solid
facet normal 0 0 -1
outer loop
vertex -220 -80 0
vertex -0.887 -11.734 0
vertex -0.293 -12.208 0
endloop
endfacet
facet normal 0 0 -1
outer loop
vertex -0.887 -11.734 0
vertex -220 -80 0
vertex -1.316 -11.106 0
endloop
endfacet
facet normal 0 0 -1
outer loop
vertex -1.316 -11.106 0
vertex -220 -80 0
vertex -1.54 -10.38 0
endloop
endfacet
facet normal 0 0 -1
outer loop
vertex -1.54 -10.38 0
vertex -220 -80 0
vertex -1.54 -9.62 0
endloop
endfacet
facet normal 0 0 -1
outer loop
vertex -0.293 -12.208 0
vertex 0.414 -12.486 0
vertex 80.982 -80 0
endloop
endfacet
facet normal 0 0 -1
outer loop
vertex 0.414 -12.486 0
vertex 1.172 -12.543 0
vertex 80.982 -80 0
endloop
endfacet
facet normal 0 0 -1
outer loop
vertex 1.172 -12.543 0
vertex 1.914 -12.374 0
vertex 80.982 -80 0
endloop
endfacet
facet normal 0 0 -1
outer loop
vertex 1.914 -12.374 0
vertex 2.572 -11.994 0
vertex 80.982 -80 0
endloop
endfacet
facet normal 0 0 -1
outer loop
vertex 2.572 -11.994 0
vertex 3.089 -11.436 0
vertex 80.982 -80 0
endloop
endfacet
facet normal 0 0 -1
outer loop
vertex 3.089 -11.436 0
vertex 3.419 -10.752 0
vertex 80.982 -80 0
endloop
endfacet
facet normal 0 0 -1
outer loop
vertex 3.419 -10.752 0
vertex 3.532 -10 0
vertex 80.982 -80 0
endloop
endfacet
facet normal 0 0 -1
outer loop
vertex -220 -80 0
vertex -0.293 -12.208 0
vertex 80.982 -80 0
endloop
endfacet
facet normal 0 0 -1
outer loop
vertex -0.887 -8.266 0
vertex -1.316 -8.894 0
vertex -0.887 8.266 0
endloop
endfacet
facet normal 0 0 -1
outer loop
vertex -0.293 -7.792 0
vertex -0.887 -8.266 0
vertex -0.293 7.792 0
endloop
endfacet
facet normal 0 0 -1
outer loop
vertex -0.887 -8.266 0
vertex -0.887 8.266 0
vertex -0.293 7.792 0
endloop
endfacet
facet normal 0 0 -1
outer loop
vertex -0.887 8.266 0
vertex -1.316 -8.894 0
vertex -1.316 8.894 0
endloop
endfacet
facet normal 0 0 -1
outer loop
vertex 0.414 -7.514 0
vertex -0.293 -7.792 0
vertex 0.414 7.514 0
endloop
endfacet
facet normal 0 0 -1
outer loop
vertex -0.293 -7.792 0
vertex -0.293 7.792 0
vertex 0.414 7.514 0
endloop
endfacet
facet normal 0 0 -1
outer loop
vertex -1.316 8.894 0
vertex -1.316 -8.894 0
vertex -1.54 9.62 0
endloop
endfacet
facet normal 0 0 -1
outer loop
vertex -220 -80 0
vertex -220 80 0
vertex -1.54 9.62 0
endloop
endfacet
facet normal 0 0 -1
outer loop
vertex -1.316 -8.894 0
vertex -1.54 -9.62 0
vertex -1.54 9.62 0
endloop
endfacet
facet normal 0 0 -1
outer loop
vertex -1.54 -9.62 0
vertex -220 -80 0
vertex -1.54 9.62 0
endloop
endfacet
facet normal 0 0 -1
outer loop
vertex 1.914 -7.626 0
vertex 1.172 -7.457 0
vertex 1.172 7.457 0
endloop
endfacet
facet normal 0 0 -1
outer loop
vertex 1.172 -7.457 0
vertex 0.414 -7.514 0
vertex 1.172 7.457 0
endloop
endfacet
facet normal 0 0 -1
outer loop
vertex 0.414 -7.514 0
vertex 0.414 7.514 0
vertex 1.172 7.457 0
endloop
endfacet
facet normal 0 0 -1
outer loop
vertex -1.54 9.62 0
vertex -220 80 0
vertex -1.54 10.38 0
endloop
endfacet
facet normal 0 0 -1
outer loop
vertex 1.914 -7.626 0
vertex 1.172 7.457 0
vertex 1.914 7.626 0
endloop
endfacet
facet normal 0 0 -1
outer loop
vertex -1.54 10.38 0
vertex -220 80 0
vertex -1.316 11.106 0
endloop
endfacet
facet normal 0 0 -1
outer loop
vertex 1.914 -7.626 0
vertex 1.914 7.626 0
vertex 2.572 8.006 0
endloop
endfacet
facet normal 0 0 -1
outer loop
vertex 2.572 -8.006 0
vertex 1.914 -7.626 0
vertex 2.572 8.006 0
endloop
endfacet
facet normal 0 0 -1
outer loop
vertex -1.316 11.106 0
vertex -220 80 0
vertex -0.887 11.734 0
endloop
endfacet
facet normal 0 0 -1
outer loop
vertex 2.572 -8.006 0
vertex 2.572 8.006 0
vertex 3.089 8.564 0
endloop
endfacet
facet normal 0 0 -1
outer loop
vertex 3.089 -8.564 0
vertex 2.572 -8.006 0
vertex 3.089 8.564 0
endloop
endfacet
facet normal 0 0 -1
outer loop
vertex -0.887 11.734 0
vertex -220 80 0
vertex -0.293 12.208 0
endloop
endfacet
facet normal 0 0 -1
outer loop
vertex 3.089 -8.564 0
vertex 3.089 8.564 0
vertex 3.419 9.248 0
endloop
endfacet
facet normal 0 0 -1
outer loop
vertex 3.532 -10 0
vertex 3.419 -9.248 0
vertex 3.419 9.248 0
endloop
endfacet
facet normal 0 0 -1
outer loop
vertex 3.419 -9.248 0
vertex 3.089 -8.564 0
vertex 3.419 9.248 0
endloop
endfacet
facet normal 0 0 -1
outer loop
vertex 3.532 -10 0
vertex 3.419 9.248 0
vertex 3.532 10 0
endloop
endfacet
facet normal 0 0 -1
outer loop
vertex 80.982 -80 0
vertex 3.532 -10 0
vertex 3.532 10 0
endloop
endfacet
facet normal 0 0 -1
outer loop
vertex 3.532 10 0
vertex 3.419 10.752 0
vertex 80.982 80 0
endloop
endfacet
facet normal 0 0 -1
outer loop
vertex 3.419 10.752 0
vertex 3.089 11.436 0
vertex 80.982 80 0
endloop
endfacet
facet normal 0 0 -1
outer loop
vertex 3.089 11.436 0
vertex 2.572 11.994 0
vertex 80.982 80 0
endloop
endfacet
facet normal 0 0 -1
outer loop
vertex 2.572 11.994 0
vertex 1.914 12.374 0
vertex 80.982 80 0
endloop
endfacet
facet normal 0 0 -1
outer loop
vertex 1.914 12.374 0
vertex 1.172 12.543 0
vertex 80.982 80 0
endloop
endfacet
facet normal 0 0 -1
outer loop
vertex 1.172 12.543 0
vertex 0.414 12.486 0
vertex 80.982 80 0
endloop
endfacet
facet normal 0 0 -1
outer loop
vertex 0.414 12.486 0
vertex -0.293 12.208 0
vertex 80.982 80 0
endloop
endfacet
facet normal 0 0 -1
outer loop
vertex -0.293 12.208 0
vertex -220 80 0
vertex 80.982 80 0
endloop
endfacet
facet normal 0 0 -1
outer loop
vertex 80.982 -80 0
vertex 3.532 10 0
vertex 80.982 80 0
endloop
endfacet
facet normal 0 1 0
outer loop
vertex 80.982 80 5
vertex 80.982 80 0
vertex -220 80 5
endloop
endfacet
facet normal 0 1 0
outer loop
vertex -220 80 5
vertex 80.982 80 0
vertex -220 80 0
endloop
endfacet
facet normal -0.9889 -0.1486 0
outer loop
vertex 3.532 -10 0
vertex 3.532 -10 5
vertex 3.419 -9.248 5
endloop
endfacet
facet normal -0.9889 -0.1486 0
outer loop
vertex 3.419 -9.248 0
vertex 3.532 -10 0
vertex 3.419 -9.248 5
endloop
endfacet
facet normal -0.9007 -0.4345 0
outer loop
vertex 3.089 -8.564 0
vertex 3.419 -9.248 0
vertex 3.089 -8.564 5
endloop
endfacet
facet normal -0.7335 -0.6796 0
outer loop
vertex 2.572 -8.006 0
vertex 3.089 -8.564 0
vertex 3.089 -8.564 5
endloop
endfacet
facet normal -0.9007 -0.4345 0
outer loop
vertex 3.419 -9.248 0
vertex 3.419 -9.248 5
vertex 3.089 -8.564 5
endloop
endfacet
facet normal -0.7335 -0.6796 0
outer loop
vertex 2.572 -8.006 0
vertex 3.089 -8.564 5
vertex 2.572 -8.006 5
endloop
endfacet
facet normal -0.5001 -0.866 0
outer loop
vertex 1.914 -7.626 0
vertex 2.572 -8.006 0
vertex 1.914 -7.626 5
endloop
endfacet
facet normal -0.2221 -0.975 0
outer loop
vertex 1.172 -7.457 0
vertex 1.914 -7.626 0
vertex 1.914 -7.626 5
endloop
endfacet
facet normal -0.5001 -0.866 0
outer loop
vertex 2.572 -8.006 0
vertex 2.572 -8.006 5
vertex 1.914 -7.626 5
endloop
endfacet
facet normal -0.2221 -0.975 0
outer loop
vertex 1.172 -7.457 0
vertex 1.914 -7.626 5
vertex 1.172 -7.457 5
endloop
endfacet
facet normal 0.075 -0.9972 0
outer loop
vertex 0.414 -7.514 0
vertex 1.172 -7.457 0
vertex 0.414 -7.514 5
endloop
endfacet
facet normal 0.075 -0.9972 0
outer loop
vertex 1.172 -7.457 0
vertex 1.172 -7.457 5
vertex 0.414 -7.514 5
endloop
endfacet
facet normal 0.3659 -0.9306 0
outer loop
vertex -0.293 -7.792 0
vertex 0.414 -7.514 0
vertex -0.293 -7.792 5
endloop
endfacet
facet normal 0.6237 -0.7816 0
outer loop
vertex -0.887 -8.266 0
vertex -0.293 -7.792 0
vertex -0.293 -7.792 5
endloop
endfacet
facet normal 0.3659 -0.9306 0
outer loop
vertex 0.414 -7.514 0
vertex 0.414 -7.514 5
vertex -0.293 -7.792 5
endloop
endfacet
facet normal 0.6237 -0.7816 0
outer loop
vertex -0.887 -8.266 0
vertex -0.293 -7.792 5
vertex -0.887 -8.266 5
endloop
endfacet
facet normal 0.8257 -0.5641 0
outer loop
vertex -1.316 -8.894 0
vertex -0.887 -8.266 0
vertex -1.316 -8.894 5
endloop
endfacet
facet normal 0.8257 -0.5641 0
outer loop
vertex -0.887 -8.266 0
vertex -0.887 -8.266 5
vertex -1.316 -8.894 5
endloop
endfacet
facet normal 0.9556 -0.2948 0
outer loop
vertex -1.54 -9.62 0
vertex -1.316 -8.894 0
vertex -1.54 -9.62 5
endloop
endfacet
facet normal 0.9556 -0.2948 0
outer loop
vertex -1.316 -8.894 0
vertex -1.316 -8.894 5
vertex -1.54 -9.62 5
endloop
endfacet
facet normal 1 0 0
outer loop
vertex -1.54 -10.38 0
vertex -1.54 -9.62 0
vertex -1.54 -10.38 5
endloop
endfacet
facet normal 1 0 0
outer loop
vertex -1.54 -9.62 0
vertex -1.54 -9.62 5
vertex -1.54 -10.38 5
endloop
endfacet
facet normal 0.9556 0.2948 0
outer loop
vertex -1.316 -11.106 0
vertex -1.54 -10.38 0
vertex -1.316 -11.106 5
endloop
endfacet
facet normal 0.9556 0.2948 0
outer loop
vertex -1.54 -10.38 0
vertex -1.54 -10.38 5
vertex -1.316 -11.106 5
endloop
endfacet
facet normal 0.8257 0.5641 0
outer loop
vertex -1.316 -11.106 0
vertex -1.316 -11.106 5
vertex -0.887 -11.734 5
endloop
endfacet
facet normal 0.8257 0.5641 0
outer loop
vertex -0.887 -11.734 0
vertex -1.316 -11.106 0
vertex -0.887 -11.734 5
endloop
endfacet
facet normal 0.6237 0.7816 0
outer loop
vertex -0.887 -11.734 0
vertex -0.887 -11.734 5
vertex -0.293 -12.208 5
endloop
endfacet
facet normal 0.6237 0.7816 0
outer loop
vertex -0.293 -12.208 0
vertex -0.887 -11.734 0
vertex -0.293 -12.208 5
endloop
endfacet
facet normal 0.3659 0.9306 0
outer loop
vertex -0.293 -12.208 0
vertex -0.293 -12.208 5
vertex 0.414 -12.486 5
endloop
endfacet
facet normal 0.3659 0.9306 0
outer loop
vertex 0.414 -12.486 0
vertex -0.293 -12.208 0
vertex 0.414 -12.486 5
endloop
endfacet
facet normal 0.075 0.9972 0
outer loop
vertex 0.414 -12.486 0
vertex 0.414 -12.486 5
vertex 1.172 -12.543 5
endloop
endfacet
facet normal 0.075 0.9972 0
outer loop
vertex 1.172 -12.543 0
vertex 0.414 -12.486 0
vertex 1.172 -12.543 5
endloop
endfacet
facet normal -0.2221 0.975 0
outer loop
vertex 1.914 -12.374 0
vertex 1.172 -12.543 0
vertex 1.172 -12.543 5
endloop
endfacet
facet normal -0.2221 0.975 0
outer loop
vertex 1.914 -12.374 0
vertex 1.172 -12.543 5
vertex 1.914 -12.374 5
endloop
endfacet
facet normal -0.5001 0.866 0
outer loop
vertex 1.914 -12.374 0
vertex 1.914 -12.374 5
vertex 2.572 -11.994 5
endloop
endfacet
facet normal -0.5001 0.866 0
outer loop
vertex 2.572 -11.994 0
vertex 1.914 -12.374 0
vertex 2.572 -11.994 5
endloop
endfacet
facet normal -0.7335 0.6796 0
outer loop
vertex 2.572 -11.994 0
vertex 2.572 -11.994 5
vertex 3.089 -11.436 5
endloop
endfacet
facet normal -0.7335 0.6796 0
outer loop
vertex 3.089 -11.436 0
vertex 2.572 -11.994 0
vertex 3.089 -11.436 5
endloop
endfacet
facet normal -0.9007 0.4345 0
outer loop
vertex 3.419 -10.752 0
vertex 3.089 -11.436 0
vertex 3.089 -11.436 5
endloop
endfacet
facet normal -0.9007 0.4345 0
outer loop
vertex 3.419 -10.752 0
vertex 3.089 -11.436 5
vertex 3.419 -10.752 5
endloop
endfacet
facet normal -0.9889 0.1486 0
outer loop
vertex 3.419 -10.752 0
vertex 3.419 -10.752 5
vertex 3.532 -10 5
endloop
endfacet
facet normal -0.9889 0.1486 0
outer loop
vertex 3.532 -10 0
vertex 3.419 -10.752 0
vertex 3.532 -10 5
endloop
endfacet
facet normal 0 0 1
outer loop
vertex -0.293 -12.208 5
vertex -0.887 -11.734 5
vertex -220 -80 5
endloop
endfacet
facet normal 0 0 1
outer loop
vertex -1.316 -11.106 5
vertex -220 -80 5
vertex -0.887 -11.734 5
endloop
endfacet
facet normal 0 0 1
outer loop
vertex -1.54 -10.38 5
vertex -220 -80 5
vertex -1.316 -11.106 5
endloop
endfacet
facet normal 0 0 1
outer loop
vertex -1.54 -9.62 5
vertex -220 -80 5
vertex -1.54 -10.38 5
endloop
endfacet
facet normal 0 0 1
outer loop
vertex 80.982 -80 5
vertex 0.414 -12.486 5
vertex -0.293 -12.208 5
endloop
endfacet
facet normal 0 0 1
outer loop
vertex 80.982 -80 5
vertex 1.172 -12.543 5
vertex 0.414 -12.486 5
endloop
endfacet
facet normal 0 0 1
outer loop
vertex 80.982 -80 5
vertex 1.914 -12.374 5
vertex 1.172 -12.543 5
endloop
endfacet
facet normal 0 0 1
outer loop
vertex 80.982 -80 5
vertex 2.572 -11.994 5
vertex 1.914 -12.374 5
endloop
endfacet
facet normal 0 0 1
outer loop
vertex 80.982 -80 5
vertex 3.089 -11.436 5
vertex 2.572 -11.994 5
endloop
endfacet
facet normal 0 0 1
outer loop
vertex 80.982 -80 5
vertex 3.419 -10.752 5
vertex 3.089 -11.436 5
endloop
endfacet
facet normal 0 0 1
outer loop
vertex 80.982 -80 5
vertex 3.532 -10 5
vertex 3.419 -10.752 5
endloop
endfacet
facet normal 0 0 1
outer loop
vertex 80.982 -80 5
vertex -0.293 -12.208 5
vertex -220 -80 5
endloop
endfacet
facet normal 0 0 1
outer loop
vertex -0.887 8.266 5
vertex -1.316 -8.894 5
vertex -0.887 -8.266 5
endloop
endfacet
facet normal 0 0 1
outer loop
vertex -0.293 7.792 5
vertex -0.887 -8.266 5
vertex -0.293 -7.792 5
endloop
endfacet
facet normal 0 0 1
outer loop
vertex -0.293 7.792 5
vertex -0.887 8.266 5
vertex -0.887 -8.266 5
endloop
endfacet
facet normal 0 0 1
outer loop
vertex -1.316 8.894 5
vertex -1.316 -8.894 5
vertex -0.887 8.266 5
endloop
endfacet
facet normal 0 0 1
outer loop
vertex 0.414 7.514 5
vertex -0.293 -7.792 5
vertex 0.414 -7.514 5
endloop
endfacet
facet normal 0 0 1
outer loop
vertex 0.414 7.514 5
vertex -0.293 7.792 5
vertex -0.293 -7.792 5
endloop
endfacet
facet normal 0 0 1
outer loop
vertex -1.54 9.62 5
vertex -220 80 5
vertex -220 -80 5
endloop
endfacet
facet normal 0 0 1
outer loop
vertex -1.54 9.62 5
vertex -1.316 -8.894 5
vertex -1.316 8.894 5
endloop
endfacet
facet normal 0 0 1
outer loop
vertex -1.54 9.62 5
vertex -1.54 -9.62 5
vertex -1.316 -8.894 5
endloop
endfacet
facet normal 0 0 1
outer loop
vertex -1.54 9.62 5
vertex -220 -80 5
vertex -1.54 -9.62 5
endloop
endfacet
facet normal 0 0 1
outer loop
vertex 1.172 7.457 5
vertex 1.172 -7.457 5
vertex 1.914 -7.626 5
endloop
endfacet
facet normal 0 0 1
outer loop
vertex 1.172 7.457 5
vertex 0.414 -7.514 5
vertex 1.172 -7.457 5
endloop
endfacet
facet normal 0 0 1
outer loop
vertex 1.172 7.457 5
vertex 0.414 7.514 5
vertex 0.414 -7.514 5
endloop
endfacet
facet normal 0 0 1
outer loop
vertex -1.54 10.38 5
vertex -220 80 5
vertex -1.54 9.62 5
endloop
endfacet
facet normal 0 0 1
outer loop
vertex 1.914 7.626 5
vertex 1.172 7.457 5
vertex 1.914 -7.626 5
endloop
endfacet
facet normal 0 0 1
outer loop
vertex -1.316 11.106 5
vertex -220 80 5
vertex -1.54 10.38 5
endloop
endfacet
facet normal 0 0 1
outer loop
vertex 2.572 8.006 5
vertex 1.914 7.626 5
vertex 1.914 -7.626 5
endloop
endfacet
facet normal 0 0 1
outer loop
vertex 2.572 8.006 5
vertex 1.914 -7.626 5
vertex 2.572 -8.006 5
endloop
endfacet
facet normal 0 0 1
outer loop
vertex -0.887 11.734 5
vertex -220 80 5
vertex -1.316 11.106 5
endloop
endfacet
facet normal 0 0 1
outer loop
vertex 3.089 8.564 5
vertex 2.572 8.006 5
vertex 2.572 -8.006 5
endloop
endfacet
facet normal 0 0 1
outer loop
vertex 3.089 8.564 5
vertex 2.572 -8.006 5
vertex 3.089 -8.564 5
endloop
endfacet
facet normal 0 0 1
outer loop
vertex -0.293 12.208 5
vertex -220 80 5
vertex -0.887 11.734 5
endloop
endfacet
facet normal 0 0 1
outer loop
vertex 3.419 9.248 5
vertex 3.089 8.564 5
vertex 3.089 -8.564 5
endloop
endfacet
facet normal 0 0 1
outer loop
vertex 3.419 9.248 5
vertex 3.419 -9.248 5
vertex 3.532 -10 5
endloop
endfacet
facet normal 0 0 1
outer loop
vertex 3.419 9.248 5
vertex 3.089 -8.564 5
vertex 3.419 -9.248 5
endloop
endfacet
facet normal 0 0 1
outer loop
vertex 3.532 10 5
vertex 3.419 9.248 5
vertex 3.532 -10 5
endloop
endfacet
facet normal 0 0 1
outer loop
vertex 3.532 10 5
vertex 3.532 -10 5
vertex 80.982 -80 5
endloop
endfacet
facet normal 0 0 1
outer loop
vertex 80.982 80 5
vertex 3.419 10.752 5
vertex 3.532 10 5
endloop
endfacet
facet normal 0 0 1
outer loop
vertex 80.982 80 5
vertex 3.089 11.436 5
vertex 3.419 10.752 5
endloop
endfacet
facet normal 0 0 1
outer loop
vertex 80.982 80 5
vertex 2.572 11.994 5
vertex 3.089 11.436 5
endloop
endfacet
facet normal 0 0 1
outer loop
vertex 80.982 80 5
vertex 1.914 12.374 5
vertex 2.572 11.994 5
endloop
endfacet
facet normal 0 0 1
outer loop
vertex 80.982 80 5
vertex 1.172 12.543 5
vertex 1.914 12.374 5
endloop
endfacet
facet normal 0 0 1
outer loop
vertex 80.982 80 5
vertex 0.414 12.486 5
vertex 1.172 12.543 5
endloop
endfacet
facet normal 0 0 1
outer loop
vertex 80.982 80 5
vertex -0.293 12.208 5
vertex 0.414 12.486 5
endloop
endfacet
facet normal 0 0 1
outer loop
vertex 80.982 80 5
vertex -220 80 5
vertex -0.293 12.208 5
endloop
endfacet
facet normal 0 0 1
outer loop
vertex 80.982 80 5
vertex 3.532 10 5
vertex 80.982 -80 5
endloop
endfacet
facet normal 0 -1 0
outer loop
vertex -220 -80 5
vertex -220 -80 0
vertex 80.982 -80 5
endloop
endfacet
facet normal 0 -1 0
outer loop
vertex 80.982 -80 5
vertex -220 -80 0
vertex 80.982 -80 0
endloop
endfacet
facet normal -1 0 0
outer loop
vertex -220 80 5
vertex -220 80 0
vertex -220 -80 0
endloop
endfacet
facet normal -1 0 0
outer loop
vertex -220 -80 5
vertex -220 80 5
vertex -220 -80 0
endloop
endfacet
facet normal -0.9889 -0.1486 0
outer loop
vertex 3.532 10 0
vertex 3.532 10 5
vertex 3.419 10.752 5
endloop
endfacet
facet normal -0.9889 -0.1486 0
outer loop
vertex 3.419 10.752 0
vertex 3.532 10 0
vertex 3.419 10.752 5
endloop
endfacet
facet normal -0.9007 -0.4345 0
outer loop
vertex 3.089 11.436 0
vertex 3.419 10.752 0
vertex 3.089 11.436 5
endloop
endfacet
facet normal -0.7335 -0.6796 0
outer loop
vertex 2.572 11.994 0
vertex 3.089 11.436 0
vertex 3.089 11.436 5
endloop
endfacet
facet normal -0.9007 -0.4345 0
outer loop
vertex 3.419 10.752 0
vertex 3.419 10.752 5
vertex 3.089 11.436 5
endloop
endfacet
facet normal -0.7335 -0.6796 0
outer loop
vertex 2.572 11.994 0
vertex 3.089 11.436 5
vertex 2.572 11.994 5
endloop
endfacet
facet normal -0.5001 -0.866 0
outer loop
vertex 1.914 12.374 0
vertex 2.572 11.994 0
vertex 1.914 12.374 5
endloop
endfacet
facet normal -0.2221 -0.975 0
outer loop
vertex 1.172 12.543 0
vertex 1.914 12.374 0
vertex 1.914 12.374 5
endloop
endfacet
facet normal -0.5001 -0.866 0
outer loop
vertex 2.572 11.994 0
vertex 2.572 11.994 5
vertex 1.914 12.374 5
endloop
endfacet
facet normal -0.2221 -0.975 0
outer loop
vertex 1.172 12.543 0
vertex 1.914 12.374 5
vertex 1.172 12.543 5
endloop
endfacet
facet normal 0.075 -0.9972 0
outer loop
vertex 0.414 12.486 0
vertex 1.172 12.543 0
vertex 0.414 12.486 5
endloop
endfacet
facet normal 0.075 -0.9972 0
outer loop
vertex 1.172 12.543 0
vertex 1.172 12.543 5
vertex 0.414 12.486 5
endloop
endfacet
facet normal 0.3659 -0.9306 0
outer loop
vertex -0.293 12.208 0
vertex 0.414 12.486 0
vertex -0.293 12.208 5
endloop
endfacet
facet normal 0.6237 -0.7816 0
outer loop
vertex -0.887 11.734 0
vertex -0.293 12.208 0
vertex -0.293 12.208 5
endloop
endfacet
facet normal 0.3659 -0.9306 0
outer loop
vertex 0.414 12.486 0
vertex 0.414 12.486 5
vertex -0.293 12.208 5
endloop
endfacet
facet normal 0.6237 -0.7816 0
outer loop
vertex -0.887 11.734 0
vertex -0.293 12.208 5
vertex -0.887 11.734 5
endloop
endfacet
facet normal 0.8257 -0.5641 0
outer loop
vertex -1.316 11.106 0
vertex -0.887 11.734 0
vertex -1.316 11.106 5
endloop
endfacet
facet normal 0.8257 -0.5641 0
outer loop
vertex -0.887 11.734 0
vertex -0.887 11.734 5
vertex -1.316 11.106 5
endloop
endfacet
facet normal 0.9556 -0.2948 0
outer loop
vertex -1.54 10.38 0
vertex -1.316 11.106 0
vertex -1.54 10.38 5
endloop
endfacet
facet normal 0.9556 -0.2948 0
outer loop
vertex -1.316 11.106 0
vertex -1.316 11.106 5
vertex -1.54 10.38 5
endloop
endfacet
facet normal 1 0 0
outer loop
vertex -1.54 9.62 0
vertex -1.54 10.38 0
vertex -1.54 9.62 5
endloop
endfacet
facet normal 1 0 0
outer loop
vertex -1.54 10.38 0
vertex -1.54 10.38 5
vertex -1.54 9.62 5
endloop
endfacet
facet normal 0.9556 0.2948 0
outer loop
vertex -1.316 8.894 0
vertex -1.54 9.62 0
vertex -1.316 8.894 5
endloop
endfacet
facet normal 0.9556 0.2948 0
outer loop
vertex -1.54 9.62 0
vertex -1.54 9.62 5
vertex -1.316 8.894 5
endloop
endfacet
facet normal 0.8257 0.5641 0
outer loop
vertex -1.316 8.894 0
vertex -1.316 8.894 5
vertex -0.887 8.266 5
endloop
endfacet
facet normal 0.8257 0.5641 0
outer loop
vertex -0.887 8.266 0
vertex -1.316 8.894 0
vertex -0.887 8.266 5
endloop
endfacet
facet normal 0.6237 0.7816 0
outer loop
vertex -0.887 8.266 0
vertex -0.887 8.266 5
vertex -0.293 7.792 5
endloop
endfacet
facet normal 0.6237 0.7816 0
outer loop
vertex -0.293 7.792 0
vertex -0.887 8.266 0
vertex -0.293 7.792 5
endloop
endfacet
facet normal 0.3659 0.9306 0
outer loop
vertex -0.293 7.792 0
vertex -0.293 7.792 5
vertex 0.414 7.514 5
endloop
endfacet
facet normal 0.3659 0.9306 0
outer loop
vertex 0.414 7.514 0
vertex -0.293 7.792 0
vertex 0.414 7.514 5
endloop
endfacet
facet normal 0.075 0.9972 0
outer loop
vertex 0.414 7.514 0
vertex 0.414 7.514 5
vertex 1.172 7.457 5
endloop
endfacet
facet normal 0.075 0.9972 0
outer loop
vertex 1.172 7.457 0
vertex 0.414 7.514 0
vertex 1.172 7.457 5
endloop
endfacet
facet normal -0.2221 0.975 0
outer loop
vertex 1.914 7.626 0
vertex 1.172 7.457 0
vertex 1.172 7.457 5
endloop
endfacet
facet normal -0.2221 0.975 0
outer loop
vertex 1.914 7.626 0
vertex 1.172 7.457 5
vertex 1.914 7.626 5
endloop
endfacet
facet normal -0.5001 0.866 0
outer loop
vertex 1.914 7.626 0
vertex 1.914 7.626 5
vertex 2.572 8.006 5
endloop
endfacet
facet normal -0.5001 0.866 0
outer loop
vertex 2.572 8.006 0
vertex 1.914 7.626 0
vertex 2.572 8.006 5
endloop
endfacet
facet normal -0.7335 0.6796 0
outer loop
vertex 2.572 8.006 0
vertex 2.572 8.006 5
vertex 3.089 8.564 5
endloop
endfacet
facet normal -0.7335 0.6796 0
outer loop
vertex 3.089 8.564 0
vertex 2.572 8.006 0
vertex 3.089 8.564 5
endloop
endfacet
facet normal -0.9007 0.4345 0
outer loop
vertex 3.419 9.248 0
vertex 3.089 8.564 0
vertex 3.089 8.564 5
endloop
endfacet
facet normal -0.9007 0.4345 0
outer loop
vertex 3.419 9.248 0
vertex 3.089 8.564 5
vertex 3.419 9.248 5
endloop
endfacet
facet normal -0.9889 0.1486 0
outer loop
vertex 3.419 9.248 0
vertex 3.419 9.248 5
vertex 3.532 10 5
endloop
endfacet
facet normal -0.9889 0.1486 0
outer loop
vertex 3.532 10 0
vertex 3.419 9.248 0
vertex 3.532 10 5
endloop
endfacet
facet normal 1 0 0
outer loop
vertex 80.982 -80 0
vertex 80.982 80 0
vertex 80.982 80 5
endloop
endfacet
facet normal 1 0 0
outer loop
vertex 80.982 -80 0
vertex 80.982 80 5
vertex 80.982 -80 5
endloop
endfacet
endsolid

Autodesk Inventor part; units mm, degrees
ref_plane "YZ Plane" through (0, 0, 0) normal (1, 0, 0) x (0, 1, 0)
ref_plane "XZ Plane" through (0, 0, 0) normal (0, 1, 0) x (-1, 0, 0)
ref_plane "XY Plane" through (0, 0, 0) normal (0, 0, 1) x (1, 0, 0)
sketch "Sketch1" plane through (0, 0, 0) normal (0, 0, 1) x (1, 0, 0)
  line L0 (160, 80) -> (-160, 80) projected
  line L1 (-160, -80) -> (160, -80) projected
  line L2 (80.9819, 80) -> (80.9819, -80)
  line L3 (-160, 80) -> (-220, 80)
  line L4 (-220, 80) -> (-220, -80)
  line L5 (-220, -80) -> (-160, -80)
  point P0 (0, 0)
  dimension "d3" = 60
extrude "Extrusion1" add sketch "Sketch1" along normal blind 5
sketch "Sketch2" plane through (0, 0, 5) normal (0, 0, 1) x (1, 0, 0)
  circle A0 centre (0.9819, 10) radius 2.55 projected
  circle A1 centre (0.9819, -10) radius 2.55 projected
  point P0 (0, 0)
extrude "Extrusion2" cut sketch "Sketch2" against normal through all
properties part number "Top sliding plate new" material "Aluminum 6061"
